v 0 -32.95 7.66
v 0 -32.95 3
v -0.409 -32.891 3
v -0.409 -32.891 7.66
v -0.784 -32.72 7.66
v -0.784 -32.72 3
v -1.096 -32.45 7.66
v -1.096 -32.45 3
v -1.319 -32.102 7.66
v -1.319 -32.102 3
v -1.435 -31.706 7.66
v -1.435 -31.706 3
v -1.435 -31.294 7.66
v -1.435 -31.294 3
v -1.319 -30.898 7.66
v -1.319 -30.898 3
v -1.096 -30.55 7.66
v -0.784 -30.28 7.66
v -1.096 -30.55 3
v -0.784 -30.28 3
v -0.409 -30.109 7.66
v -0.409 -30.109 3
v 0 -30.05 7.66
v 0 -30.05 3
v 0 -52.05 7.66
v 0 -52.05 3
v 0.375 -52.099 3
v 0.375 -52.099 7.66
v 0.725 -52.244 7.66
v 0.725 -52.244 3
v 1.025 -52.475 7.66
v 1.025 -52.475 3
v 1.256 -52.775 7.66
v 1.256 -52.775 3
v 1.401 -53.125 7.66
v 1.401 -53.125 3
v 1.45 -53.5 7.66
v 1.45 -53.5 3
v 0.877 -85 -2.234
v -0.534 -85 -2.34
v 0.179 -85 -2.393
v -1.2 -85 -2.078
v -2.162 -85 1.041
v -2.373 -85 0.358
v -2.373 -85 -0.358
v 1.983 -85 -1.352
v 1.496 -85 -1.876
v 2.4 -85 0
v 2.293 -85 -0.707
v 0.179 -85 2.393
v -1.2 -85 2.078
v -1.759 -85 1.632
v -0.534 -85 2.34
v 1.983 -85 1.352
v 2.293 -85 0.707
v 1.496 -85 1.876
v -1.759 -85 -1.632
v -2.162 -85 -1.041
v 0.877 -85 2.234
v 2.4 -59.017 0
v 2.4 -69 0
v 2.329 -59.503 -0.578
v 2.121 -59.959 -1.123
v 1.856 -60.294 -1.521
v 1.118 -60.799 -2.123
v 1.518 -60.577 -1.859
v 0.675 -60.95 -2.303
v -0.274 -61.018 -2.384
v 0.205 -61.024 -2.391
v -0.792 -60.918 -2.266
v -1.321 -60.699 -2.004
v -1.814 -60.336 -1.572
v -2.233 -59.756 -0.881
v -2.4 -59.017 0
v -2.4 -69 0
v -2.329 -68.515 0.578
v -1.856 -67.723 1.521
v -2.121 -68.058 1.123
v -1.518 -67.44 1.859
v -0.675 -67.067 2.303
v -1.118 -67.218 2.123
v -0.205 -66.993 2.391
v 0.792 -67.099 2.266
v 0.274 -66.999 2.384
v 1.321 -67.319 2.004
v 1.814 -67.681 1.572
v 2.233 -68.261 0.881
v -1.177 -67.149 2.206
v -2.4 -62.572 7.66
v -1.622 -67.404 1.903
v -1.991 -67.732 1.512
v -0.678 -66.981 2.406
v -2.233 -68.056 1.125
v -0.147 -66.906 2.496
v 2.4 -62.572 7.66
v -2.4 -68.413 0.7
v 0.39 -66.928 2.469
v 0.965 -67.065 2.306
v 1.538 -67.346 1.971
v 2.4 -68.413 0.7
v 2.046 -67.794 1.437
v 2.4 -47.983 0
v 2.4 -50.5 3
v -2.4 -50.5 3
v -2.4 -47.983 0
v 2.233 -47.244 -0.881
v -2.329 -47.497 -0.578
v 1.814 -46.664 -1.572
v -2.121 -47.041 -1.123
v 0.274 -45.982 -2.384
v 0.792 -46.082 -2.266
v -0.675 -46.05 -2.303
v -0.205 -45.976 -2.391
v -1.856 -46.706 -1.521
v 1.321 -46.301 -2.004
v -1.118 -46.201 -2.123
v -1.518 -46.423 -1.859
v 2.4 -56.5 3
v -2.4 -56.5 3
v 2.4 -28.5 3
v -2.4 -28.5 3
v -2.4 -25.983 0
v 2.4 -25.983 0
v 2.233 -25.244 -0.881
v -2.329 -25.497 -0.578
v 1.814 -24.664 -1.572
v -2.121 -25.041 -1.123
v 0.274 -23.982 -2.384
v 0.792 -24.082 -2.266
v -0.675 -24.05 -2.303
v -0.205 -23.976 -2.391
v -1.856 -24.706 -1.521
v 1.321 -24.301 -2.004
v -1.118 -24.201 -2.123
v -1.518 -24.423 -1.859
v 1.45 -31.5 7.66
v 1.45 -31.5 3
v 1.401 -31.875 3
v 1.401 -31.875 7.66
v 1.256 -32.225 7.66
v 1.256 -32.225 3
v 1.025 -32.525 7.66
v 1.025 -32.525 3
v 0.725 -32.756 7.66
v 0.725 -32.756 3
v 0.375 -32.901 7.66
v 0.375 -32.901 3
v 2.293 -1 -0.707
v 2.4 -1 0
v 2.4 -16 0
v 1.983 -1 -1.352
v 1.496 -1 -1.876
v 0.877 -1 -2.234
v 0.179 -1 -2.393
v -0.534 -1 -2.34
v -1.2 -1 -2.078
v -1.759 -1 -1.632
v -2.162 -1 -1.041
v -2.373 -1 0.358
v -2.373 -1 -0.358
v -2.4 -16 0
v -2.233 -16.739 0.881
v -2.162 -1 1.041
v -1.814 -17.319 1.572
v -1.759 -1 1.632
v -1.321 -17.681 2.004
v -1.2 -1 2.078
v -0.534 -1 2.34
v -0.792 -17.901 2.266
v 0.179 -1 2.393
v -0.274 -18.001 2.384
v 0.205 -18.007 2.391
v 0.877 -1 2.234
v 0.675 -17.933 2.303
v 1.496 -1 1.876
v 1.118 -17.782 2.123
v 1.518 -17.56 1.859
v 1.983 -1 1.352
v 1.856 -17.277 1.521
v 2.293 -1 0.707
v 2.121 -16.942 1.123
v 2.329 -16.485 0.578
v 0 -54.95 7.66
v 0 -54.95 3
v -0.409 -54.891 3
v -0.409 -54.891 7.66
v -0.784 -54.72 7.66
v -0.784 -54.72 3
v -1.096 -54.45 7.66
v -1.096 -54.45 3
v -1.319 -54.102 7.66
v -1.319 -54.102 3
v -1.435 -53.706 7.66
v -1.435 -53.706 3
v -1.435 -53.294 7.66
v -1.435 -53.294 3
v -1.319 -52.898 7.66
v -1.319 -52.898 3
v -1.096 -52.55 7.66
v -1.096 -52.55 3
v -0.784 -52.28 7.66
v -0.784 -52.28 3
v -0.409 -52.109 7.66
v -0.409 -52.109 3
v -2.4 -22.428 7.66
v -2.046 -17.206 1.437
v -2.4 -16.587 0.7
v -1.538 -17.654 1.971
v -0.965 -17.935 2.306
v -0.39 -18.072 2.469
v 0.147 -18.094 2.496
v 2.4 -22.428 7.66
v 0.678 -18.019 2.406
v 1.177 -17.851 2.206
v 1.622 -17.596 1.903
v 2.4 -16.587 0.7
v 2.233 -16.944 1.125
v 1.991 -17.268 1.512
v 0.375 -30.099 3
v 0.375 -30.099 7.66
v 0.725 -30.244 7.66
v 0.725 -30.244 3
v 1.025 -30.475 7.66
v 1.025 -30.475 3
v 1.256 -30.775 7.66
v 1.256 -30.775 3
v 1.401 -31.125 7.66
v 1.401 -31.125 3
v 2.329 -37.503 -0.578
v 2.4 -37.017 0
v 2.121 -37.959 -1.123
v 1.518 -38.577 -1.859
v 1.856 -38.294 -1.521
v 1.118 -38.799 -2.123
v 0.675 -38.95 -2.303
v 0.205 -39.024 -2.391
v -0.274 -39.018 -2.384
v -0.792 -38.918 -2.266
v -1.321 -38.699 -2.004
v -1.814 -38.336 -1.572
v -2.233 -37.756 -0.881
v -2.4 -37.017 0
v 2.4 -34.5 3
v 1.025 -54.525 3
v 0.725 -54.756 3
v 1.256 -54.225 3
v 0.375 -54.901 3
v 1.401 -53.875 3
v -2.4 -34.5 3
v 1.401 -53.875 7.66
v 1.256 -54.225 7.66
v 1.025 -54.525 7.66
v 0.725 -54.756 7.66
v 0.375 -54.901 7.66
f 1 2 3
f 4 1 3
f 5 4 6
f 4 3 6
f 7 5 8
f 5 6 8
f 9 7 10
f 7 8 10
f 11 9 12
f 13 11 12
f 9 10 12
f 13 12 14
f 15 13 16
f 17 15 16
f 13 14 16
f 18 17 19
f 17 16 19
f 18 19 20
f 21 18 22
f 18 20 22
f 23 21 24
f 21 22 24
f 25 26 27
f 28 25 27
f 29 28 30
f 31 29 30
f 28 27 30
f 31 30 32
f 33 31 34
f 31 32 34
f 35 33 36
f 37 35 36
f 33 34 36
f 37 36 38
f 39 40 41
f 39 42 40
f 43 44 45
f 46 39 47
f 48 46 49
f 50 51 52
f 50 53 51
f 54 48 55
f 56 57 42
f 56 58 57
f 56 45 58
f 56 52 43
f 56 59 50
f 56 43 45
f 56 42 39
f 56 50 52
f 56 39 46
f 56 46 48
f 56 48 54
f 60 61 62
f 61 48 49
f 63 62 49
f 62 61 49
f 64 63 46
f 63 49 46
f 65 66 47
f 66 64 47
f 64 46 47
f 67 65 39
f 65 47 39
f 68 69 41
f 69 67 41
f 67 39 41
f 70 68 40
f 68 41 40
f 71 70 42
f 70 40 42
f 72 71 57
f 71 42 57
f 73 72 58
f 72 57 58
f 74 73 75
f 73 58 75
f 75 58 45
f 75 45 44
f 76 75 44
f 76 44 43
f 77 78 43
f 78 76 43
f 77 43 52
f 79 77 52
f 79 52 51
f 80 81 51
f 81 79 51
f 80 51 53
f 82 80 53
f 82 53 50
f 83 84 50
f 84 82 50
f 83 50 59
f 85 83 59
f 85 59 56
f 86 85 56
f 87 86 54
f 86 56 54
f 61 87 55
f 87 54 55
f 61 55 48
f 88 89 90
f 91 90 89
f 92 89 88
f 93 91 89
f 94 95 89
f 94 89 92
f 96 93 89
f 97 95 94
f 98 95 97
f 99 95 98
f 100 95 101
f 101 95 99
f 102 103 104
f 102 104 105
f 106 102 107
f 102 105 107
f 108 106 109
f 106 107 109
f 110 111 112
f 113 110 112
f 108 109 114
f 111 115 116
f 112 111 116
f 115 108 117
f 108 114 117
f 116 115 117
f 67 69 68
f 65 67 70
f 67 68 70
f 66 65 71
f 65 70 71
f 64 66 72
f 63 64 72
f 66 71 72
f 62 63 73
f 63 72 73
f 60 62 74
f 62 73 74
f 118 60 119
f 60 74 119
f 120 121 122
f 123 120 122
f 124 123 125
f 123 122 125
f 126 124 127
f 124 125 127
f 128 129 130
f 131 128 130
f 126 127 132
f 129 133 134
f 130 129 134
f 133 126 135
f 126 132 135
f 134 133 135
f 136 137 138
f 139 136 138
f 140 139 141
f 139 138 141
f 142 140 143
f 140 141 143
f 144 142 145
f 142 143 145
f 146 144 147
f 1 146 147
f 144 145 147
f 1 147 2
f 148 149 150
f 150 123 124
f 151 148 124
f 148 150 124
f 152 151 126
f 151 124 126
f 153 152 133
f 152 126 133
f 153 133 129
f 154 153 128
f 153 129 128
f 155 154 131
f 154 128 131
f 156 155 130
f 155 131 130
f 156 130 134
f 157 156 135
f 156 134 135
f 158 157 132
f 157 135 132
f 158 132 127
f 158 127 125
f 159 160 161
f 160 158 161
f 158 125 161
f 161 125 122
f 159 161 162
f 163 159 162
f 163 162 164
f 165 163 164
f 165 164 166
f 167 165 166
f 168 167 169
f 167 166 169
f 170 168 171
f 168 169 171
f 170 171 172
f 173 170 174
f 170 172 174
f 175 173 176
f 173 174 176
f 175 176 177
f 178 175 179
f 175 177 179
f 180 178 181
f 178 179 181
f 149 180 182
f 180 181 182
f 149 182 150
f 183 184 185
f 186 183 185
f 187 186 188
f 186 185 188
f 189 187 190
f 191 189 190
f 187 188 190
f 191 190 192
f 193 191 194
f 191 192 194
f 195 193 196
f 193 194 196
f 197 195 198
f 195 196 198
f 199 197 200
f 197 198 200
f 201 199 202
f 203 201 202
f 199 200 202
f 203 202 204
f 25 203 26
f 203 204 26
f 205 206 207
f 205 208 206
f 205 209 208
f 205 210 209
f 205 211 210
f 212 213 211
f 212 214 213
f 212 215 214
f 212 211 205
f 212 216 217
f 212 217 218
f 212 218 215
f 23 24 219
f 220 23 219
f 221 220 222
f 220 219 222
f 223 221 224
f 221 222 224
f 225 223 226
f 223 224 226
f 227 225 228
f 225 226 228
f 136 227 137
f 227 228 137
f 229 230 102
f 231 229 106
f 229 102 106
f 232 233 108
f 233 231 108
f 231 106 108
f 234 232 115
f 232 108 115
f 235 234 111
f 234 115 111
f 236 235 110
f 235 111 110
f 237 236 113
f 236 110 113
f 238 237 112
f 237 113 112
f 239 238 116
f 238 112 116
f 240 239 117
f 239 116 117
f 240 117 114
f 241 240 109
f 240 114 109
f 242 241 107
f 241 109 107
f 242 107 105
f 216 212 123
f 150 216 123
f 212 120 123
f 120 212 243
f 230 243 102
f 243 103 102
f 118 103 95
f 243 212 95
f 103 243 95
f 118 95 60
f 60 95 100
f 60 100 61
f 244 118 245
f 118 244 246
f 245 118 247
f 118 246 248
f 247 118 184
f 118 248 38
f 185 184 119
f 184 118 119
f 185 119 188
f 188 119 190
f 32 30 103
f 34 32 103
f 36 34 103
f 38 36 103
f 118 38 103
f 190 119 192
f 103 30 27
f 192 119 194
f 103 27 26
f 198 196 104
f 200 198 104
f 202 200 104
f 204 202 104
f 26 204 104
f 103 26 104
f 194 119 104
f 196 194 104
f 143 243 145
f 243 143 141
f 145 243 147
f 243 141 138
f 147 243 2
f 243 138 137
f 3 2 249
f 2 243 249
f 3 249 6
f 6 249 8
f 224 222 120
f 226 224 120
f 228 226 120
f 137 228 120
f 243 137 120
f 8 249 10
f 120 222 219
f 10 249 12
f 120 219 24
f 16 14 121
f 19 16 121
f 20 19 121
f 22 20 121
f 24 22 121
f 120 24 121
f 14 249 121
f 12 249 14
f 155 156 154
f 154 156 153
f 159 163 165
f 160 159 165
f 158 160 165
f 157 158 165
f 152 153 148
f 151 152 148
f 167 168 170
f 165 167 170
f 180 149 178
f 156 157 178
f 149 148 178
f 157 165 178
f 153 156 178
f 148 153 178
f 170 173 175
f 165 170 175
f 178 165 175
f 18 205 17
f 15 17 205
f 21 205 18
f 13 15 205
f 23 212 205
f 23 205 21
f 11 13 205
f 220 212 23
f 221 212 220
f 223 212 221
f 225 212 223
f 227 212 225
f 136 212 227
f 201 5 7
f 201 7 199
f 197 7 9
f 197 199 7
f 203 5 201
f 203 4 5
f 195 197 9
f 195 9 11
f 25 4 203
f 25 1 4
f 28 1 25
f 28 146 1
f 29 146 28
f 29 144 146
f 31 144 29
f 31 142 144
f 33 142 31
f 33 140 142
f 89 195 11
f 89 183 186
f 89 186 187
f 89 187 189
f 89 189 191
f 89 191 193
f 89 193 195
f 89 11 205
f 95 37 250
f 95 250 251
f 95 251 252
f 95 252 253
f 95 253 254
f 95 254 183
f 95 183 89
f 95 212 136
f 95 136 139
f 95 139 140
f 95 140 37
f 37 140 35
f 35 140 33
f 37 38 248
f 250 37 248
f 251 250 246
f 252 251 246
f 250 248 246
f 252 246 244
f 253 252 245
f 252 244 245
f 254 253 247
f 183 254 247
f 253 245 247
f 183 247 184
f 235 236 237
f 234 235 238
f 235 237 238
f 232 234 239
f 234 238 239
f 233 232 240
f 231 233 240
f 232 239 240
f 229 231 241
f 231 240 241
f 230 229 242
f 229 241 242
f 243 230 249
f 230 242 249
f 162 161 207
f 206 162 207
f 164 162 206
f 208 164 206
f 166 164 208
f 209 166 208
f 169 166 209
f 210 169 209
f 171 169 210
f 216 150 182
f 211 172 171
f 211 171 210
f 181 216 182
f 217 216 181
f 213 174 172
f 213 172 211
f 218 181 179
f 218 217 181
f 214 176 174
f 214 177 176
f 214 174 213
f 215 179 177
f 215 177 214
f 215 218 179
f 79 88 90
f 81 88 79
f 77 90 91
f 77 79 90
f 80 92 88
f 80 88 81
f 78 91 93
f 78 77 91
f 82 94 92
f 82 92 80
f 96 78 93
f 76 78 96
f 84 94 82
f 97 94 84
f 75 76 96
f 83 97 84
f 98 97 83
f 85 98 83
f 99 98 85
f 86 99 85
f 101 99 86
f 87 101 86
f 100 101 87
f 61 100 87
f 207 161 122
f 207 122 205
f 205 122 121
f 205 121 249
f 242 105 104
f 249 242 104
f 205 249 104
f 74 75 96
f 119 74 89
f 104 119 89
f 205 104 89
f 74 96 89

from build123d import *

# Parameters (mm, degrees)
F0_R      = 2.5
F1_DEPTH  = 85
F3_DEPTH  = 2.5
F5_DEPTH  = 25
F8_DEPTH  = 25
F9_DEPTH  = 25
F11_DEPTH = 25
F14_DEPTH = 102
F16_REACH = 96.5783545855
F18_REACH = 97.7333268634
F19_DEPTH = 1


with BuildPart() as f1:
    # F0 (on Front) → F1 (new body)
    with BuildSketch(Plane.XZ):
        Circle(F0_R)
    extrude(amount=F1_DEPTH)

    # F2 (on Right) → F3 (join, symmetric)
    with BuildSketch(Plane.YZ):
        Polygon((-69, 0), (-16, 0), (-22.4278760969, 7.6604444312), (-62.5721239031, 7.6604444312), align=None)
    extrude(amount=F3_DEPTH, both=True)

    # F4 (on face) → F5 (cut)
    with BuildSketch(Plane(origin=(-2.5, 0, 0), x_dir=(0, -1, 0), z_dir=(-1, 0, 0))):
        Polygon((56.5, 3), (53.5, 3), (50.5, 3), (44.1691353238, -4.5448307221), (62.8308646762, -4.5448307221), align=None)
        Polygon((40.8308646762, -4.5448307221), (34.5, 3), (31.5, 3), (28.5, 3), (22.1691353238, -4.5448307221), align=None)
    extrude(amount=-F5_DEPTH, mode=Mode.SUBTRACT)

    # F7 (on face) → F8 (cut)
    with BuildSketch(Plane(origin=(-2.5, 0, 0), x_dir=(0, -1, 0), z_dir=(-1, 0, 0))):
        Polygon((19.9172031134, 7.5), (22.2932472338, 7.5), (22.4278760969, 7.6604444312), (62.5721239031, 7.6604444312), (62.7067527662, 7.5), (66.5233954787, 7.5), (66.5233954787, 10.3880958632), (19.9172031134, 10.3880958632), align=None)
    extrude(amount=-F8_DEPTH, mode=Mode.SUBTRACT)

    # F6 (on face) → F9 (cut)
    with BuildSketch(Plane(origin=(0, 0, 3), x_dir=(1, 0, 0), z_dir=(0, 0, -1))):
        with BuildLine():
            ThreePointArc((1.45, 53.5), (1.0253048327, 54.5253048327), (0, 54.95))
            Line((0, 54.95), (0, 52.05))
            ThreePointArc((0, 52.05), (1.0253048327, 52.4746951673), (1.45, 53.5))
        make_face()
        with BuildLine():
            Line((0, 52.05), (0, 54.95))
            ThreePointArc((0, 54.95), (-1.45, 53.5), (0, 52.05))
        make_face()
    extrude(amount=-F9_DEPTH, mode=Mode.SUBTRACT)

    # F10 (on face) → F11 (cut)
    with BuildSketch(Plane(origin=(0, 0, 3), x_dir=(1, 0, 0), z_dir=(0, 0, -1))):
        with BuildLine():
            ThreePointArc((1.45, 31.5), (1.0253048327, 32.5253048327), (0, 32.95))
            Line((0, 32.95), (0, 30.05))
            ThreePointArc((0, 30.05), (1.0253048327, 30.4746951673), (1.45, 31.5))
        make_face()
        with BuildLine():
            Line((0, 30.05), (0, 32.95))
            ThreePointArc((0, 32.95), (-1.45, 31.5), (0, 30.05))
        make_face()
    extrude(amount=-F11_DEPTH, mode=Mode.SUBTRACT)

    # F13 (on face) → F14 (cut)
    with BuildSketch(Plane.XZ.offset(85)):
        with BuildLine():
            ThreePointArc((2.4, 0), (0, -2.4), (-2.4, 0))
            Line((-2.4, 0), (-2.4, 9.7710704431))
            Line((-2.4, 9.7710704431), (-6.1972029507, 9.7710704431))
            Line((-6.1972029507, 9.7710704431), (-6.1972029507, -5.7614380494))
            Line((-6.1972029507, -5.7614380494), (5.5722752586, -5.7614380494))
            Line((5.5722752586, -5.7614380494), (5.5722752586, 8.8547384366))
            Line((5.5722752586, 8.8547384366), (2.4, 9.1607915238))
            Line((2.4, 9.1607915238), (2.4, 0))
        make_face()
    extrude(amount=-F14_DEPTH, mode=Mode.SUBTRACT)

    f16_end = Plane(origin=(0, -64.9529870595, 4.8230422111), x_dir=(0, -0.6427876097, -0.7660444431), z_dir=(0, -0.7660444431, 0.6427876097))
    # F15 (on face) → F16 (cut, up to a plane its end follows)
    with BuildSketch(Plane.XZ.offset(85)):
        with BuildLine():
            ThreePointArc((-2.4, 0), (0, 2.4), (2.4, 0))
            Line((2.4, 0), (4.8319334164, 0))
            Line((4.8319334164, 0), (4.1808704846, 8.0774491653))
            Line((4.1808704846, 8.0774491653), (-2.9383567162, 8.0774491653))
            Line((-2.9383567162, 8.0774491653), (-3.4620375372, 0))
            Line((-3.4620375372, 0), (-2.4, 0))
        make_face()
    f16_long = extrude(amount=-F16_REACH, mode=Mode.PRIVATE)
    add(split(f16_long, bisect_by=f16_end, keep=Keep.TOP, mode=Mode.PRIVATE), mode=Mode.SUBTRACT)

    f18_end = Plane(origin=(0, -20.0470129405, 4.8230422111), x_dir=(0, -0.6427876097, 0.7660444431), z_dir=(0, 0.7660444431, 0.6427876097))
    # F17 (on face) → F18 (cut, up to a plane its end follows)
    with BuildSketch(Plane(origin=(0, 0, 0), x_dir=(-1, 0, 0), z_dir=(0, 1, 0))):
        with BuildLine():
            ThreePointArc((-2.4, 0), (0, 2.4), (2.4, 0))
            Line((2.4, 0), (3.9089121856, 0))
            Line((3.9089121856, 0), (4.3247276917, 8.6870230734))
            Line((4.3247276917, 8.6870230734), (-4.9837511033, 8.3660408854))
            Line((-4.9837511033, 8.3660408854), (-3.4170385916, 0))
            Line((-3.4170385916, 0), (-2.4, 0))
        make_face()
    f18_long = extrude(amount=-F18_REACH, mode=Mode.PRIVATE)
    add(split(f18_long, bisect_by=f18_end, keep=Keep.TOP, mode=Mode.PRIVATE), mode=Mode.SUBTRACT)

    # F19 (cut): a face of the model
    f19_faces = [f1.faces().sort_by_distance(p)[0] for p in [
        (0, 0, 0),
    ]]
    extrude(f19_faces, amount=-F19_DEPTH, mode=Mode.SUBTRACT)


solid = f1.part
